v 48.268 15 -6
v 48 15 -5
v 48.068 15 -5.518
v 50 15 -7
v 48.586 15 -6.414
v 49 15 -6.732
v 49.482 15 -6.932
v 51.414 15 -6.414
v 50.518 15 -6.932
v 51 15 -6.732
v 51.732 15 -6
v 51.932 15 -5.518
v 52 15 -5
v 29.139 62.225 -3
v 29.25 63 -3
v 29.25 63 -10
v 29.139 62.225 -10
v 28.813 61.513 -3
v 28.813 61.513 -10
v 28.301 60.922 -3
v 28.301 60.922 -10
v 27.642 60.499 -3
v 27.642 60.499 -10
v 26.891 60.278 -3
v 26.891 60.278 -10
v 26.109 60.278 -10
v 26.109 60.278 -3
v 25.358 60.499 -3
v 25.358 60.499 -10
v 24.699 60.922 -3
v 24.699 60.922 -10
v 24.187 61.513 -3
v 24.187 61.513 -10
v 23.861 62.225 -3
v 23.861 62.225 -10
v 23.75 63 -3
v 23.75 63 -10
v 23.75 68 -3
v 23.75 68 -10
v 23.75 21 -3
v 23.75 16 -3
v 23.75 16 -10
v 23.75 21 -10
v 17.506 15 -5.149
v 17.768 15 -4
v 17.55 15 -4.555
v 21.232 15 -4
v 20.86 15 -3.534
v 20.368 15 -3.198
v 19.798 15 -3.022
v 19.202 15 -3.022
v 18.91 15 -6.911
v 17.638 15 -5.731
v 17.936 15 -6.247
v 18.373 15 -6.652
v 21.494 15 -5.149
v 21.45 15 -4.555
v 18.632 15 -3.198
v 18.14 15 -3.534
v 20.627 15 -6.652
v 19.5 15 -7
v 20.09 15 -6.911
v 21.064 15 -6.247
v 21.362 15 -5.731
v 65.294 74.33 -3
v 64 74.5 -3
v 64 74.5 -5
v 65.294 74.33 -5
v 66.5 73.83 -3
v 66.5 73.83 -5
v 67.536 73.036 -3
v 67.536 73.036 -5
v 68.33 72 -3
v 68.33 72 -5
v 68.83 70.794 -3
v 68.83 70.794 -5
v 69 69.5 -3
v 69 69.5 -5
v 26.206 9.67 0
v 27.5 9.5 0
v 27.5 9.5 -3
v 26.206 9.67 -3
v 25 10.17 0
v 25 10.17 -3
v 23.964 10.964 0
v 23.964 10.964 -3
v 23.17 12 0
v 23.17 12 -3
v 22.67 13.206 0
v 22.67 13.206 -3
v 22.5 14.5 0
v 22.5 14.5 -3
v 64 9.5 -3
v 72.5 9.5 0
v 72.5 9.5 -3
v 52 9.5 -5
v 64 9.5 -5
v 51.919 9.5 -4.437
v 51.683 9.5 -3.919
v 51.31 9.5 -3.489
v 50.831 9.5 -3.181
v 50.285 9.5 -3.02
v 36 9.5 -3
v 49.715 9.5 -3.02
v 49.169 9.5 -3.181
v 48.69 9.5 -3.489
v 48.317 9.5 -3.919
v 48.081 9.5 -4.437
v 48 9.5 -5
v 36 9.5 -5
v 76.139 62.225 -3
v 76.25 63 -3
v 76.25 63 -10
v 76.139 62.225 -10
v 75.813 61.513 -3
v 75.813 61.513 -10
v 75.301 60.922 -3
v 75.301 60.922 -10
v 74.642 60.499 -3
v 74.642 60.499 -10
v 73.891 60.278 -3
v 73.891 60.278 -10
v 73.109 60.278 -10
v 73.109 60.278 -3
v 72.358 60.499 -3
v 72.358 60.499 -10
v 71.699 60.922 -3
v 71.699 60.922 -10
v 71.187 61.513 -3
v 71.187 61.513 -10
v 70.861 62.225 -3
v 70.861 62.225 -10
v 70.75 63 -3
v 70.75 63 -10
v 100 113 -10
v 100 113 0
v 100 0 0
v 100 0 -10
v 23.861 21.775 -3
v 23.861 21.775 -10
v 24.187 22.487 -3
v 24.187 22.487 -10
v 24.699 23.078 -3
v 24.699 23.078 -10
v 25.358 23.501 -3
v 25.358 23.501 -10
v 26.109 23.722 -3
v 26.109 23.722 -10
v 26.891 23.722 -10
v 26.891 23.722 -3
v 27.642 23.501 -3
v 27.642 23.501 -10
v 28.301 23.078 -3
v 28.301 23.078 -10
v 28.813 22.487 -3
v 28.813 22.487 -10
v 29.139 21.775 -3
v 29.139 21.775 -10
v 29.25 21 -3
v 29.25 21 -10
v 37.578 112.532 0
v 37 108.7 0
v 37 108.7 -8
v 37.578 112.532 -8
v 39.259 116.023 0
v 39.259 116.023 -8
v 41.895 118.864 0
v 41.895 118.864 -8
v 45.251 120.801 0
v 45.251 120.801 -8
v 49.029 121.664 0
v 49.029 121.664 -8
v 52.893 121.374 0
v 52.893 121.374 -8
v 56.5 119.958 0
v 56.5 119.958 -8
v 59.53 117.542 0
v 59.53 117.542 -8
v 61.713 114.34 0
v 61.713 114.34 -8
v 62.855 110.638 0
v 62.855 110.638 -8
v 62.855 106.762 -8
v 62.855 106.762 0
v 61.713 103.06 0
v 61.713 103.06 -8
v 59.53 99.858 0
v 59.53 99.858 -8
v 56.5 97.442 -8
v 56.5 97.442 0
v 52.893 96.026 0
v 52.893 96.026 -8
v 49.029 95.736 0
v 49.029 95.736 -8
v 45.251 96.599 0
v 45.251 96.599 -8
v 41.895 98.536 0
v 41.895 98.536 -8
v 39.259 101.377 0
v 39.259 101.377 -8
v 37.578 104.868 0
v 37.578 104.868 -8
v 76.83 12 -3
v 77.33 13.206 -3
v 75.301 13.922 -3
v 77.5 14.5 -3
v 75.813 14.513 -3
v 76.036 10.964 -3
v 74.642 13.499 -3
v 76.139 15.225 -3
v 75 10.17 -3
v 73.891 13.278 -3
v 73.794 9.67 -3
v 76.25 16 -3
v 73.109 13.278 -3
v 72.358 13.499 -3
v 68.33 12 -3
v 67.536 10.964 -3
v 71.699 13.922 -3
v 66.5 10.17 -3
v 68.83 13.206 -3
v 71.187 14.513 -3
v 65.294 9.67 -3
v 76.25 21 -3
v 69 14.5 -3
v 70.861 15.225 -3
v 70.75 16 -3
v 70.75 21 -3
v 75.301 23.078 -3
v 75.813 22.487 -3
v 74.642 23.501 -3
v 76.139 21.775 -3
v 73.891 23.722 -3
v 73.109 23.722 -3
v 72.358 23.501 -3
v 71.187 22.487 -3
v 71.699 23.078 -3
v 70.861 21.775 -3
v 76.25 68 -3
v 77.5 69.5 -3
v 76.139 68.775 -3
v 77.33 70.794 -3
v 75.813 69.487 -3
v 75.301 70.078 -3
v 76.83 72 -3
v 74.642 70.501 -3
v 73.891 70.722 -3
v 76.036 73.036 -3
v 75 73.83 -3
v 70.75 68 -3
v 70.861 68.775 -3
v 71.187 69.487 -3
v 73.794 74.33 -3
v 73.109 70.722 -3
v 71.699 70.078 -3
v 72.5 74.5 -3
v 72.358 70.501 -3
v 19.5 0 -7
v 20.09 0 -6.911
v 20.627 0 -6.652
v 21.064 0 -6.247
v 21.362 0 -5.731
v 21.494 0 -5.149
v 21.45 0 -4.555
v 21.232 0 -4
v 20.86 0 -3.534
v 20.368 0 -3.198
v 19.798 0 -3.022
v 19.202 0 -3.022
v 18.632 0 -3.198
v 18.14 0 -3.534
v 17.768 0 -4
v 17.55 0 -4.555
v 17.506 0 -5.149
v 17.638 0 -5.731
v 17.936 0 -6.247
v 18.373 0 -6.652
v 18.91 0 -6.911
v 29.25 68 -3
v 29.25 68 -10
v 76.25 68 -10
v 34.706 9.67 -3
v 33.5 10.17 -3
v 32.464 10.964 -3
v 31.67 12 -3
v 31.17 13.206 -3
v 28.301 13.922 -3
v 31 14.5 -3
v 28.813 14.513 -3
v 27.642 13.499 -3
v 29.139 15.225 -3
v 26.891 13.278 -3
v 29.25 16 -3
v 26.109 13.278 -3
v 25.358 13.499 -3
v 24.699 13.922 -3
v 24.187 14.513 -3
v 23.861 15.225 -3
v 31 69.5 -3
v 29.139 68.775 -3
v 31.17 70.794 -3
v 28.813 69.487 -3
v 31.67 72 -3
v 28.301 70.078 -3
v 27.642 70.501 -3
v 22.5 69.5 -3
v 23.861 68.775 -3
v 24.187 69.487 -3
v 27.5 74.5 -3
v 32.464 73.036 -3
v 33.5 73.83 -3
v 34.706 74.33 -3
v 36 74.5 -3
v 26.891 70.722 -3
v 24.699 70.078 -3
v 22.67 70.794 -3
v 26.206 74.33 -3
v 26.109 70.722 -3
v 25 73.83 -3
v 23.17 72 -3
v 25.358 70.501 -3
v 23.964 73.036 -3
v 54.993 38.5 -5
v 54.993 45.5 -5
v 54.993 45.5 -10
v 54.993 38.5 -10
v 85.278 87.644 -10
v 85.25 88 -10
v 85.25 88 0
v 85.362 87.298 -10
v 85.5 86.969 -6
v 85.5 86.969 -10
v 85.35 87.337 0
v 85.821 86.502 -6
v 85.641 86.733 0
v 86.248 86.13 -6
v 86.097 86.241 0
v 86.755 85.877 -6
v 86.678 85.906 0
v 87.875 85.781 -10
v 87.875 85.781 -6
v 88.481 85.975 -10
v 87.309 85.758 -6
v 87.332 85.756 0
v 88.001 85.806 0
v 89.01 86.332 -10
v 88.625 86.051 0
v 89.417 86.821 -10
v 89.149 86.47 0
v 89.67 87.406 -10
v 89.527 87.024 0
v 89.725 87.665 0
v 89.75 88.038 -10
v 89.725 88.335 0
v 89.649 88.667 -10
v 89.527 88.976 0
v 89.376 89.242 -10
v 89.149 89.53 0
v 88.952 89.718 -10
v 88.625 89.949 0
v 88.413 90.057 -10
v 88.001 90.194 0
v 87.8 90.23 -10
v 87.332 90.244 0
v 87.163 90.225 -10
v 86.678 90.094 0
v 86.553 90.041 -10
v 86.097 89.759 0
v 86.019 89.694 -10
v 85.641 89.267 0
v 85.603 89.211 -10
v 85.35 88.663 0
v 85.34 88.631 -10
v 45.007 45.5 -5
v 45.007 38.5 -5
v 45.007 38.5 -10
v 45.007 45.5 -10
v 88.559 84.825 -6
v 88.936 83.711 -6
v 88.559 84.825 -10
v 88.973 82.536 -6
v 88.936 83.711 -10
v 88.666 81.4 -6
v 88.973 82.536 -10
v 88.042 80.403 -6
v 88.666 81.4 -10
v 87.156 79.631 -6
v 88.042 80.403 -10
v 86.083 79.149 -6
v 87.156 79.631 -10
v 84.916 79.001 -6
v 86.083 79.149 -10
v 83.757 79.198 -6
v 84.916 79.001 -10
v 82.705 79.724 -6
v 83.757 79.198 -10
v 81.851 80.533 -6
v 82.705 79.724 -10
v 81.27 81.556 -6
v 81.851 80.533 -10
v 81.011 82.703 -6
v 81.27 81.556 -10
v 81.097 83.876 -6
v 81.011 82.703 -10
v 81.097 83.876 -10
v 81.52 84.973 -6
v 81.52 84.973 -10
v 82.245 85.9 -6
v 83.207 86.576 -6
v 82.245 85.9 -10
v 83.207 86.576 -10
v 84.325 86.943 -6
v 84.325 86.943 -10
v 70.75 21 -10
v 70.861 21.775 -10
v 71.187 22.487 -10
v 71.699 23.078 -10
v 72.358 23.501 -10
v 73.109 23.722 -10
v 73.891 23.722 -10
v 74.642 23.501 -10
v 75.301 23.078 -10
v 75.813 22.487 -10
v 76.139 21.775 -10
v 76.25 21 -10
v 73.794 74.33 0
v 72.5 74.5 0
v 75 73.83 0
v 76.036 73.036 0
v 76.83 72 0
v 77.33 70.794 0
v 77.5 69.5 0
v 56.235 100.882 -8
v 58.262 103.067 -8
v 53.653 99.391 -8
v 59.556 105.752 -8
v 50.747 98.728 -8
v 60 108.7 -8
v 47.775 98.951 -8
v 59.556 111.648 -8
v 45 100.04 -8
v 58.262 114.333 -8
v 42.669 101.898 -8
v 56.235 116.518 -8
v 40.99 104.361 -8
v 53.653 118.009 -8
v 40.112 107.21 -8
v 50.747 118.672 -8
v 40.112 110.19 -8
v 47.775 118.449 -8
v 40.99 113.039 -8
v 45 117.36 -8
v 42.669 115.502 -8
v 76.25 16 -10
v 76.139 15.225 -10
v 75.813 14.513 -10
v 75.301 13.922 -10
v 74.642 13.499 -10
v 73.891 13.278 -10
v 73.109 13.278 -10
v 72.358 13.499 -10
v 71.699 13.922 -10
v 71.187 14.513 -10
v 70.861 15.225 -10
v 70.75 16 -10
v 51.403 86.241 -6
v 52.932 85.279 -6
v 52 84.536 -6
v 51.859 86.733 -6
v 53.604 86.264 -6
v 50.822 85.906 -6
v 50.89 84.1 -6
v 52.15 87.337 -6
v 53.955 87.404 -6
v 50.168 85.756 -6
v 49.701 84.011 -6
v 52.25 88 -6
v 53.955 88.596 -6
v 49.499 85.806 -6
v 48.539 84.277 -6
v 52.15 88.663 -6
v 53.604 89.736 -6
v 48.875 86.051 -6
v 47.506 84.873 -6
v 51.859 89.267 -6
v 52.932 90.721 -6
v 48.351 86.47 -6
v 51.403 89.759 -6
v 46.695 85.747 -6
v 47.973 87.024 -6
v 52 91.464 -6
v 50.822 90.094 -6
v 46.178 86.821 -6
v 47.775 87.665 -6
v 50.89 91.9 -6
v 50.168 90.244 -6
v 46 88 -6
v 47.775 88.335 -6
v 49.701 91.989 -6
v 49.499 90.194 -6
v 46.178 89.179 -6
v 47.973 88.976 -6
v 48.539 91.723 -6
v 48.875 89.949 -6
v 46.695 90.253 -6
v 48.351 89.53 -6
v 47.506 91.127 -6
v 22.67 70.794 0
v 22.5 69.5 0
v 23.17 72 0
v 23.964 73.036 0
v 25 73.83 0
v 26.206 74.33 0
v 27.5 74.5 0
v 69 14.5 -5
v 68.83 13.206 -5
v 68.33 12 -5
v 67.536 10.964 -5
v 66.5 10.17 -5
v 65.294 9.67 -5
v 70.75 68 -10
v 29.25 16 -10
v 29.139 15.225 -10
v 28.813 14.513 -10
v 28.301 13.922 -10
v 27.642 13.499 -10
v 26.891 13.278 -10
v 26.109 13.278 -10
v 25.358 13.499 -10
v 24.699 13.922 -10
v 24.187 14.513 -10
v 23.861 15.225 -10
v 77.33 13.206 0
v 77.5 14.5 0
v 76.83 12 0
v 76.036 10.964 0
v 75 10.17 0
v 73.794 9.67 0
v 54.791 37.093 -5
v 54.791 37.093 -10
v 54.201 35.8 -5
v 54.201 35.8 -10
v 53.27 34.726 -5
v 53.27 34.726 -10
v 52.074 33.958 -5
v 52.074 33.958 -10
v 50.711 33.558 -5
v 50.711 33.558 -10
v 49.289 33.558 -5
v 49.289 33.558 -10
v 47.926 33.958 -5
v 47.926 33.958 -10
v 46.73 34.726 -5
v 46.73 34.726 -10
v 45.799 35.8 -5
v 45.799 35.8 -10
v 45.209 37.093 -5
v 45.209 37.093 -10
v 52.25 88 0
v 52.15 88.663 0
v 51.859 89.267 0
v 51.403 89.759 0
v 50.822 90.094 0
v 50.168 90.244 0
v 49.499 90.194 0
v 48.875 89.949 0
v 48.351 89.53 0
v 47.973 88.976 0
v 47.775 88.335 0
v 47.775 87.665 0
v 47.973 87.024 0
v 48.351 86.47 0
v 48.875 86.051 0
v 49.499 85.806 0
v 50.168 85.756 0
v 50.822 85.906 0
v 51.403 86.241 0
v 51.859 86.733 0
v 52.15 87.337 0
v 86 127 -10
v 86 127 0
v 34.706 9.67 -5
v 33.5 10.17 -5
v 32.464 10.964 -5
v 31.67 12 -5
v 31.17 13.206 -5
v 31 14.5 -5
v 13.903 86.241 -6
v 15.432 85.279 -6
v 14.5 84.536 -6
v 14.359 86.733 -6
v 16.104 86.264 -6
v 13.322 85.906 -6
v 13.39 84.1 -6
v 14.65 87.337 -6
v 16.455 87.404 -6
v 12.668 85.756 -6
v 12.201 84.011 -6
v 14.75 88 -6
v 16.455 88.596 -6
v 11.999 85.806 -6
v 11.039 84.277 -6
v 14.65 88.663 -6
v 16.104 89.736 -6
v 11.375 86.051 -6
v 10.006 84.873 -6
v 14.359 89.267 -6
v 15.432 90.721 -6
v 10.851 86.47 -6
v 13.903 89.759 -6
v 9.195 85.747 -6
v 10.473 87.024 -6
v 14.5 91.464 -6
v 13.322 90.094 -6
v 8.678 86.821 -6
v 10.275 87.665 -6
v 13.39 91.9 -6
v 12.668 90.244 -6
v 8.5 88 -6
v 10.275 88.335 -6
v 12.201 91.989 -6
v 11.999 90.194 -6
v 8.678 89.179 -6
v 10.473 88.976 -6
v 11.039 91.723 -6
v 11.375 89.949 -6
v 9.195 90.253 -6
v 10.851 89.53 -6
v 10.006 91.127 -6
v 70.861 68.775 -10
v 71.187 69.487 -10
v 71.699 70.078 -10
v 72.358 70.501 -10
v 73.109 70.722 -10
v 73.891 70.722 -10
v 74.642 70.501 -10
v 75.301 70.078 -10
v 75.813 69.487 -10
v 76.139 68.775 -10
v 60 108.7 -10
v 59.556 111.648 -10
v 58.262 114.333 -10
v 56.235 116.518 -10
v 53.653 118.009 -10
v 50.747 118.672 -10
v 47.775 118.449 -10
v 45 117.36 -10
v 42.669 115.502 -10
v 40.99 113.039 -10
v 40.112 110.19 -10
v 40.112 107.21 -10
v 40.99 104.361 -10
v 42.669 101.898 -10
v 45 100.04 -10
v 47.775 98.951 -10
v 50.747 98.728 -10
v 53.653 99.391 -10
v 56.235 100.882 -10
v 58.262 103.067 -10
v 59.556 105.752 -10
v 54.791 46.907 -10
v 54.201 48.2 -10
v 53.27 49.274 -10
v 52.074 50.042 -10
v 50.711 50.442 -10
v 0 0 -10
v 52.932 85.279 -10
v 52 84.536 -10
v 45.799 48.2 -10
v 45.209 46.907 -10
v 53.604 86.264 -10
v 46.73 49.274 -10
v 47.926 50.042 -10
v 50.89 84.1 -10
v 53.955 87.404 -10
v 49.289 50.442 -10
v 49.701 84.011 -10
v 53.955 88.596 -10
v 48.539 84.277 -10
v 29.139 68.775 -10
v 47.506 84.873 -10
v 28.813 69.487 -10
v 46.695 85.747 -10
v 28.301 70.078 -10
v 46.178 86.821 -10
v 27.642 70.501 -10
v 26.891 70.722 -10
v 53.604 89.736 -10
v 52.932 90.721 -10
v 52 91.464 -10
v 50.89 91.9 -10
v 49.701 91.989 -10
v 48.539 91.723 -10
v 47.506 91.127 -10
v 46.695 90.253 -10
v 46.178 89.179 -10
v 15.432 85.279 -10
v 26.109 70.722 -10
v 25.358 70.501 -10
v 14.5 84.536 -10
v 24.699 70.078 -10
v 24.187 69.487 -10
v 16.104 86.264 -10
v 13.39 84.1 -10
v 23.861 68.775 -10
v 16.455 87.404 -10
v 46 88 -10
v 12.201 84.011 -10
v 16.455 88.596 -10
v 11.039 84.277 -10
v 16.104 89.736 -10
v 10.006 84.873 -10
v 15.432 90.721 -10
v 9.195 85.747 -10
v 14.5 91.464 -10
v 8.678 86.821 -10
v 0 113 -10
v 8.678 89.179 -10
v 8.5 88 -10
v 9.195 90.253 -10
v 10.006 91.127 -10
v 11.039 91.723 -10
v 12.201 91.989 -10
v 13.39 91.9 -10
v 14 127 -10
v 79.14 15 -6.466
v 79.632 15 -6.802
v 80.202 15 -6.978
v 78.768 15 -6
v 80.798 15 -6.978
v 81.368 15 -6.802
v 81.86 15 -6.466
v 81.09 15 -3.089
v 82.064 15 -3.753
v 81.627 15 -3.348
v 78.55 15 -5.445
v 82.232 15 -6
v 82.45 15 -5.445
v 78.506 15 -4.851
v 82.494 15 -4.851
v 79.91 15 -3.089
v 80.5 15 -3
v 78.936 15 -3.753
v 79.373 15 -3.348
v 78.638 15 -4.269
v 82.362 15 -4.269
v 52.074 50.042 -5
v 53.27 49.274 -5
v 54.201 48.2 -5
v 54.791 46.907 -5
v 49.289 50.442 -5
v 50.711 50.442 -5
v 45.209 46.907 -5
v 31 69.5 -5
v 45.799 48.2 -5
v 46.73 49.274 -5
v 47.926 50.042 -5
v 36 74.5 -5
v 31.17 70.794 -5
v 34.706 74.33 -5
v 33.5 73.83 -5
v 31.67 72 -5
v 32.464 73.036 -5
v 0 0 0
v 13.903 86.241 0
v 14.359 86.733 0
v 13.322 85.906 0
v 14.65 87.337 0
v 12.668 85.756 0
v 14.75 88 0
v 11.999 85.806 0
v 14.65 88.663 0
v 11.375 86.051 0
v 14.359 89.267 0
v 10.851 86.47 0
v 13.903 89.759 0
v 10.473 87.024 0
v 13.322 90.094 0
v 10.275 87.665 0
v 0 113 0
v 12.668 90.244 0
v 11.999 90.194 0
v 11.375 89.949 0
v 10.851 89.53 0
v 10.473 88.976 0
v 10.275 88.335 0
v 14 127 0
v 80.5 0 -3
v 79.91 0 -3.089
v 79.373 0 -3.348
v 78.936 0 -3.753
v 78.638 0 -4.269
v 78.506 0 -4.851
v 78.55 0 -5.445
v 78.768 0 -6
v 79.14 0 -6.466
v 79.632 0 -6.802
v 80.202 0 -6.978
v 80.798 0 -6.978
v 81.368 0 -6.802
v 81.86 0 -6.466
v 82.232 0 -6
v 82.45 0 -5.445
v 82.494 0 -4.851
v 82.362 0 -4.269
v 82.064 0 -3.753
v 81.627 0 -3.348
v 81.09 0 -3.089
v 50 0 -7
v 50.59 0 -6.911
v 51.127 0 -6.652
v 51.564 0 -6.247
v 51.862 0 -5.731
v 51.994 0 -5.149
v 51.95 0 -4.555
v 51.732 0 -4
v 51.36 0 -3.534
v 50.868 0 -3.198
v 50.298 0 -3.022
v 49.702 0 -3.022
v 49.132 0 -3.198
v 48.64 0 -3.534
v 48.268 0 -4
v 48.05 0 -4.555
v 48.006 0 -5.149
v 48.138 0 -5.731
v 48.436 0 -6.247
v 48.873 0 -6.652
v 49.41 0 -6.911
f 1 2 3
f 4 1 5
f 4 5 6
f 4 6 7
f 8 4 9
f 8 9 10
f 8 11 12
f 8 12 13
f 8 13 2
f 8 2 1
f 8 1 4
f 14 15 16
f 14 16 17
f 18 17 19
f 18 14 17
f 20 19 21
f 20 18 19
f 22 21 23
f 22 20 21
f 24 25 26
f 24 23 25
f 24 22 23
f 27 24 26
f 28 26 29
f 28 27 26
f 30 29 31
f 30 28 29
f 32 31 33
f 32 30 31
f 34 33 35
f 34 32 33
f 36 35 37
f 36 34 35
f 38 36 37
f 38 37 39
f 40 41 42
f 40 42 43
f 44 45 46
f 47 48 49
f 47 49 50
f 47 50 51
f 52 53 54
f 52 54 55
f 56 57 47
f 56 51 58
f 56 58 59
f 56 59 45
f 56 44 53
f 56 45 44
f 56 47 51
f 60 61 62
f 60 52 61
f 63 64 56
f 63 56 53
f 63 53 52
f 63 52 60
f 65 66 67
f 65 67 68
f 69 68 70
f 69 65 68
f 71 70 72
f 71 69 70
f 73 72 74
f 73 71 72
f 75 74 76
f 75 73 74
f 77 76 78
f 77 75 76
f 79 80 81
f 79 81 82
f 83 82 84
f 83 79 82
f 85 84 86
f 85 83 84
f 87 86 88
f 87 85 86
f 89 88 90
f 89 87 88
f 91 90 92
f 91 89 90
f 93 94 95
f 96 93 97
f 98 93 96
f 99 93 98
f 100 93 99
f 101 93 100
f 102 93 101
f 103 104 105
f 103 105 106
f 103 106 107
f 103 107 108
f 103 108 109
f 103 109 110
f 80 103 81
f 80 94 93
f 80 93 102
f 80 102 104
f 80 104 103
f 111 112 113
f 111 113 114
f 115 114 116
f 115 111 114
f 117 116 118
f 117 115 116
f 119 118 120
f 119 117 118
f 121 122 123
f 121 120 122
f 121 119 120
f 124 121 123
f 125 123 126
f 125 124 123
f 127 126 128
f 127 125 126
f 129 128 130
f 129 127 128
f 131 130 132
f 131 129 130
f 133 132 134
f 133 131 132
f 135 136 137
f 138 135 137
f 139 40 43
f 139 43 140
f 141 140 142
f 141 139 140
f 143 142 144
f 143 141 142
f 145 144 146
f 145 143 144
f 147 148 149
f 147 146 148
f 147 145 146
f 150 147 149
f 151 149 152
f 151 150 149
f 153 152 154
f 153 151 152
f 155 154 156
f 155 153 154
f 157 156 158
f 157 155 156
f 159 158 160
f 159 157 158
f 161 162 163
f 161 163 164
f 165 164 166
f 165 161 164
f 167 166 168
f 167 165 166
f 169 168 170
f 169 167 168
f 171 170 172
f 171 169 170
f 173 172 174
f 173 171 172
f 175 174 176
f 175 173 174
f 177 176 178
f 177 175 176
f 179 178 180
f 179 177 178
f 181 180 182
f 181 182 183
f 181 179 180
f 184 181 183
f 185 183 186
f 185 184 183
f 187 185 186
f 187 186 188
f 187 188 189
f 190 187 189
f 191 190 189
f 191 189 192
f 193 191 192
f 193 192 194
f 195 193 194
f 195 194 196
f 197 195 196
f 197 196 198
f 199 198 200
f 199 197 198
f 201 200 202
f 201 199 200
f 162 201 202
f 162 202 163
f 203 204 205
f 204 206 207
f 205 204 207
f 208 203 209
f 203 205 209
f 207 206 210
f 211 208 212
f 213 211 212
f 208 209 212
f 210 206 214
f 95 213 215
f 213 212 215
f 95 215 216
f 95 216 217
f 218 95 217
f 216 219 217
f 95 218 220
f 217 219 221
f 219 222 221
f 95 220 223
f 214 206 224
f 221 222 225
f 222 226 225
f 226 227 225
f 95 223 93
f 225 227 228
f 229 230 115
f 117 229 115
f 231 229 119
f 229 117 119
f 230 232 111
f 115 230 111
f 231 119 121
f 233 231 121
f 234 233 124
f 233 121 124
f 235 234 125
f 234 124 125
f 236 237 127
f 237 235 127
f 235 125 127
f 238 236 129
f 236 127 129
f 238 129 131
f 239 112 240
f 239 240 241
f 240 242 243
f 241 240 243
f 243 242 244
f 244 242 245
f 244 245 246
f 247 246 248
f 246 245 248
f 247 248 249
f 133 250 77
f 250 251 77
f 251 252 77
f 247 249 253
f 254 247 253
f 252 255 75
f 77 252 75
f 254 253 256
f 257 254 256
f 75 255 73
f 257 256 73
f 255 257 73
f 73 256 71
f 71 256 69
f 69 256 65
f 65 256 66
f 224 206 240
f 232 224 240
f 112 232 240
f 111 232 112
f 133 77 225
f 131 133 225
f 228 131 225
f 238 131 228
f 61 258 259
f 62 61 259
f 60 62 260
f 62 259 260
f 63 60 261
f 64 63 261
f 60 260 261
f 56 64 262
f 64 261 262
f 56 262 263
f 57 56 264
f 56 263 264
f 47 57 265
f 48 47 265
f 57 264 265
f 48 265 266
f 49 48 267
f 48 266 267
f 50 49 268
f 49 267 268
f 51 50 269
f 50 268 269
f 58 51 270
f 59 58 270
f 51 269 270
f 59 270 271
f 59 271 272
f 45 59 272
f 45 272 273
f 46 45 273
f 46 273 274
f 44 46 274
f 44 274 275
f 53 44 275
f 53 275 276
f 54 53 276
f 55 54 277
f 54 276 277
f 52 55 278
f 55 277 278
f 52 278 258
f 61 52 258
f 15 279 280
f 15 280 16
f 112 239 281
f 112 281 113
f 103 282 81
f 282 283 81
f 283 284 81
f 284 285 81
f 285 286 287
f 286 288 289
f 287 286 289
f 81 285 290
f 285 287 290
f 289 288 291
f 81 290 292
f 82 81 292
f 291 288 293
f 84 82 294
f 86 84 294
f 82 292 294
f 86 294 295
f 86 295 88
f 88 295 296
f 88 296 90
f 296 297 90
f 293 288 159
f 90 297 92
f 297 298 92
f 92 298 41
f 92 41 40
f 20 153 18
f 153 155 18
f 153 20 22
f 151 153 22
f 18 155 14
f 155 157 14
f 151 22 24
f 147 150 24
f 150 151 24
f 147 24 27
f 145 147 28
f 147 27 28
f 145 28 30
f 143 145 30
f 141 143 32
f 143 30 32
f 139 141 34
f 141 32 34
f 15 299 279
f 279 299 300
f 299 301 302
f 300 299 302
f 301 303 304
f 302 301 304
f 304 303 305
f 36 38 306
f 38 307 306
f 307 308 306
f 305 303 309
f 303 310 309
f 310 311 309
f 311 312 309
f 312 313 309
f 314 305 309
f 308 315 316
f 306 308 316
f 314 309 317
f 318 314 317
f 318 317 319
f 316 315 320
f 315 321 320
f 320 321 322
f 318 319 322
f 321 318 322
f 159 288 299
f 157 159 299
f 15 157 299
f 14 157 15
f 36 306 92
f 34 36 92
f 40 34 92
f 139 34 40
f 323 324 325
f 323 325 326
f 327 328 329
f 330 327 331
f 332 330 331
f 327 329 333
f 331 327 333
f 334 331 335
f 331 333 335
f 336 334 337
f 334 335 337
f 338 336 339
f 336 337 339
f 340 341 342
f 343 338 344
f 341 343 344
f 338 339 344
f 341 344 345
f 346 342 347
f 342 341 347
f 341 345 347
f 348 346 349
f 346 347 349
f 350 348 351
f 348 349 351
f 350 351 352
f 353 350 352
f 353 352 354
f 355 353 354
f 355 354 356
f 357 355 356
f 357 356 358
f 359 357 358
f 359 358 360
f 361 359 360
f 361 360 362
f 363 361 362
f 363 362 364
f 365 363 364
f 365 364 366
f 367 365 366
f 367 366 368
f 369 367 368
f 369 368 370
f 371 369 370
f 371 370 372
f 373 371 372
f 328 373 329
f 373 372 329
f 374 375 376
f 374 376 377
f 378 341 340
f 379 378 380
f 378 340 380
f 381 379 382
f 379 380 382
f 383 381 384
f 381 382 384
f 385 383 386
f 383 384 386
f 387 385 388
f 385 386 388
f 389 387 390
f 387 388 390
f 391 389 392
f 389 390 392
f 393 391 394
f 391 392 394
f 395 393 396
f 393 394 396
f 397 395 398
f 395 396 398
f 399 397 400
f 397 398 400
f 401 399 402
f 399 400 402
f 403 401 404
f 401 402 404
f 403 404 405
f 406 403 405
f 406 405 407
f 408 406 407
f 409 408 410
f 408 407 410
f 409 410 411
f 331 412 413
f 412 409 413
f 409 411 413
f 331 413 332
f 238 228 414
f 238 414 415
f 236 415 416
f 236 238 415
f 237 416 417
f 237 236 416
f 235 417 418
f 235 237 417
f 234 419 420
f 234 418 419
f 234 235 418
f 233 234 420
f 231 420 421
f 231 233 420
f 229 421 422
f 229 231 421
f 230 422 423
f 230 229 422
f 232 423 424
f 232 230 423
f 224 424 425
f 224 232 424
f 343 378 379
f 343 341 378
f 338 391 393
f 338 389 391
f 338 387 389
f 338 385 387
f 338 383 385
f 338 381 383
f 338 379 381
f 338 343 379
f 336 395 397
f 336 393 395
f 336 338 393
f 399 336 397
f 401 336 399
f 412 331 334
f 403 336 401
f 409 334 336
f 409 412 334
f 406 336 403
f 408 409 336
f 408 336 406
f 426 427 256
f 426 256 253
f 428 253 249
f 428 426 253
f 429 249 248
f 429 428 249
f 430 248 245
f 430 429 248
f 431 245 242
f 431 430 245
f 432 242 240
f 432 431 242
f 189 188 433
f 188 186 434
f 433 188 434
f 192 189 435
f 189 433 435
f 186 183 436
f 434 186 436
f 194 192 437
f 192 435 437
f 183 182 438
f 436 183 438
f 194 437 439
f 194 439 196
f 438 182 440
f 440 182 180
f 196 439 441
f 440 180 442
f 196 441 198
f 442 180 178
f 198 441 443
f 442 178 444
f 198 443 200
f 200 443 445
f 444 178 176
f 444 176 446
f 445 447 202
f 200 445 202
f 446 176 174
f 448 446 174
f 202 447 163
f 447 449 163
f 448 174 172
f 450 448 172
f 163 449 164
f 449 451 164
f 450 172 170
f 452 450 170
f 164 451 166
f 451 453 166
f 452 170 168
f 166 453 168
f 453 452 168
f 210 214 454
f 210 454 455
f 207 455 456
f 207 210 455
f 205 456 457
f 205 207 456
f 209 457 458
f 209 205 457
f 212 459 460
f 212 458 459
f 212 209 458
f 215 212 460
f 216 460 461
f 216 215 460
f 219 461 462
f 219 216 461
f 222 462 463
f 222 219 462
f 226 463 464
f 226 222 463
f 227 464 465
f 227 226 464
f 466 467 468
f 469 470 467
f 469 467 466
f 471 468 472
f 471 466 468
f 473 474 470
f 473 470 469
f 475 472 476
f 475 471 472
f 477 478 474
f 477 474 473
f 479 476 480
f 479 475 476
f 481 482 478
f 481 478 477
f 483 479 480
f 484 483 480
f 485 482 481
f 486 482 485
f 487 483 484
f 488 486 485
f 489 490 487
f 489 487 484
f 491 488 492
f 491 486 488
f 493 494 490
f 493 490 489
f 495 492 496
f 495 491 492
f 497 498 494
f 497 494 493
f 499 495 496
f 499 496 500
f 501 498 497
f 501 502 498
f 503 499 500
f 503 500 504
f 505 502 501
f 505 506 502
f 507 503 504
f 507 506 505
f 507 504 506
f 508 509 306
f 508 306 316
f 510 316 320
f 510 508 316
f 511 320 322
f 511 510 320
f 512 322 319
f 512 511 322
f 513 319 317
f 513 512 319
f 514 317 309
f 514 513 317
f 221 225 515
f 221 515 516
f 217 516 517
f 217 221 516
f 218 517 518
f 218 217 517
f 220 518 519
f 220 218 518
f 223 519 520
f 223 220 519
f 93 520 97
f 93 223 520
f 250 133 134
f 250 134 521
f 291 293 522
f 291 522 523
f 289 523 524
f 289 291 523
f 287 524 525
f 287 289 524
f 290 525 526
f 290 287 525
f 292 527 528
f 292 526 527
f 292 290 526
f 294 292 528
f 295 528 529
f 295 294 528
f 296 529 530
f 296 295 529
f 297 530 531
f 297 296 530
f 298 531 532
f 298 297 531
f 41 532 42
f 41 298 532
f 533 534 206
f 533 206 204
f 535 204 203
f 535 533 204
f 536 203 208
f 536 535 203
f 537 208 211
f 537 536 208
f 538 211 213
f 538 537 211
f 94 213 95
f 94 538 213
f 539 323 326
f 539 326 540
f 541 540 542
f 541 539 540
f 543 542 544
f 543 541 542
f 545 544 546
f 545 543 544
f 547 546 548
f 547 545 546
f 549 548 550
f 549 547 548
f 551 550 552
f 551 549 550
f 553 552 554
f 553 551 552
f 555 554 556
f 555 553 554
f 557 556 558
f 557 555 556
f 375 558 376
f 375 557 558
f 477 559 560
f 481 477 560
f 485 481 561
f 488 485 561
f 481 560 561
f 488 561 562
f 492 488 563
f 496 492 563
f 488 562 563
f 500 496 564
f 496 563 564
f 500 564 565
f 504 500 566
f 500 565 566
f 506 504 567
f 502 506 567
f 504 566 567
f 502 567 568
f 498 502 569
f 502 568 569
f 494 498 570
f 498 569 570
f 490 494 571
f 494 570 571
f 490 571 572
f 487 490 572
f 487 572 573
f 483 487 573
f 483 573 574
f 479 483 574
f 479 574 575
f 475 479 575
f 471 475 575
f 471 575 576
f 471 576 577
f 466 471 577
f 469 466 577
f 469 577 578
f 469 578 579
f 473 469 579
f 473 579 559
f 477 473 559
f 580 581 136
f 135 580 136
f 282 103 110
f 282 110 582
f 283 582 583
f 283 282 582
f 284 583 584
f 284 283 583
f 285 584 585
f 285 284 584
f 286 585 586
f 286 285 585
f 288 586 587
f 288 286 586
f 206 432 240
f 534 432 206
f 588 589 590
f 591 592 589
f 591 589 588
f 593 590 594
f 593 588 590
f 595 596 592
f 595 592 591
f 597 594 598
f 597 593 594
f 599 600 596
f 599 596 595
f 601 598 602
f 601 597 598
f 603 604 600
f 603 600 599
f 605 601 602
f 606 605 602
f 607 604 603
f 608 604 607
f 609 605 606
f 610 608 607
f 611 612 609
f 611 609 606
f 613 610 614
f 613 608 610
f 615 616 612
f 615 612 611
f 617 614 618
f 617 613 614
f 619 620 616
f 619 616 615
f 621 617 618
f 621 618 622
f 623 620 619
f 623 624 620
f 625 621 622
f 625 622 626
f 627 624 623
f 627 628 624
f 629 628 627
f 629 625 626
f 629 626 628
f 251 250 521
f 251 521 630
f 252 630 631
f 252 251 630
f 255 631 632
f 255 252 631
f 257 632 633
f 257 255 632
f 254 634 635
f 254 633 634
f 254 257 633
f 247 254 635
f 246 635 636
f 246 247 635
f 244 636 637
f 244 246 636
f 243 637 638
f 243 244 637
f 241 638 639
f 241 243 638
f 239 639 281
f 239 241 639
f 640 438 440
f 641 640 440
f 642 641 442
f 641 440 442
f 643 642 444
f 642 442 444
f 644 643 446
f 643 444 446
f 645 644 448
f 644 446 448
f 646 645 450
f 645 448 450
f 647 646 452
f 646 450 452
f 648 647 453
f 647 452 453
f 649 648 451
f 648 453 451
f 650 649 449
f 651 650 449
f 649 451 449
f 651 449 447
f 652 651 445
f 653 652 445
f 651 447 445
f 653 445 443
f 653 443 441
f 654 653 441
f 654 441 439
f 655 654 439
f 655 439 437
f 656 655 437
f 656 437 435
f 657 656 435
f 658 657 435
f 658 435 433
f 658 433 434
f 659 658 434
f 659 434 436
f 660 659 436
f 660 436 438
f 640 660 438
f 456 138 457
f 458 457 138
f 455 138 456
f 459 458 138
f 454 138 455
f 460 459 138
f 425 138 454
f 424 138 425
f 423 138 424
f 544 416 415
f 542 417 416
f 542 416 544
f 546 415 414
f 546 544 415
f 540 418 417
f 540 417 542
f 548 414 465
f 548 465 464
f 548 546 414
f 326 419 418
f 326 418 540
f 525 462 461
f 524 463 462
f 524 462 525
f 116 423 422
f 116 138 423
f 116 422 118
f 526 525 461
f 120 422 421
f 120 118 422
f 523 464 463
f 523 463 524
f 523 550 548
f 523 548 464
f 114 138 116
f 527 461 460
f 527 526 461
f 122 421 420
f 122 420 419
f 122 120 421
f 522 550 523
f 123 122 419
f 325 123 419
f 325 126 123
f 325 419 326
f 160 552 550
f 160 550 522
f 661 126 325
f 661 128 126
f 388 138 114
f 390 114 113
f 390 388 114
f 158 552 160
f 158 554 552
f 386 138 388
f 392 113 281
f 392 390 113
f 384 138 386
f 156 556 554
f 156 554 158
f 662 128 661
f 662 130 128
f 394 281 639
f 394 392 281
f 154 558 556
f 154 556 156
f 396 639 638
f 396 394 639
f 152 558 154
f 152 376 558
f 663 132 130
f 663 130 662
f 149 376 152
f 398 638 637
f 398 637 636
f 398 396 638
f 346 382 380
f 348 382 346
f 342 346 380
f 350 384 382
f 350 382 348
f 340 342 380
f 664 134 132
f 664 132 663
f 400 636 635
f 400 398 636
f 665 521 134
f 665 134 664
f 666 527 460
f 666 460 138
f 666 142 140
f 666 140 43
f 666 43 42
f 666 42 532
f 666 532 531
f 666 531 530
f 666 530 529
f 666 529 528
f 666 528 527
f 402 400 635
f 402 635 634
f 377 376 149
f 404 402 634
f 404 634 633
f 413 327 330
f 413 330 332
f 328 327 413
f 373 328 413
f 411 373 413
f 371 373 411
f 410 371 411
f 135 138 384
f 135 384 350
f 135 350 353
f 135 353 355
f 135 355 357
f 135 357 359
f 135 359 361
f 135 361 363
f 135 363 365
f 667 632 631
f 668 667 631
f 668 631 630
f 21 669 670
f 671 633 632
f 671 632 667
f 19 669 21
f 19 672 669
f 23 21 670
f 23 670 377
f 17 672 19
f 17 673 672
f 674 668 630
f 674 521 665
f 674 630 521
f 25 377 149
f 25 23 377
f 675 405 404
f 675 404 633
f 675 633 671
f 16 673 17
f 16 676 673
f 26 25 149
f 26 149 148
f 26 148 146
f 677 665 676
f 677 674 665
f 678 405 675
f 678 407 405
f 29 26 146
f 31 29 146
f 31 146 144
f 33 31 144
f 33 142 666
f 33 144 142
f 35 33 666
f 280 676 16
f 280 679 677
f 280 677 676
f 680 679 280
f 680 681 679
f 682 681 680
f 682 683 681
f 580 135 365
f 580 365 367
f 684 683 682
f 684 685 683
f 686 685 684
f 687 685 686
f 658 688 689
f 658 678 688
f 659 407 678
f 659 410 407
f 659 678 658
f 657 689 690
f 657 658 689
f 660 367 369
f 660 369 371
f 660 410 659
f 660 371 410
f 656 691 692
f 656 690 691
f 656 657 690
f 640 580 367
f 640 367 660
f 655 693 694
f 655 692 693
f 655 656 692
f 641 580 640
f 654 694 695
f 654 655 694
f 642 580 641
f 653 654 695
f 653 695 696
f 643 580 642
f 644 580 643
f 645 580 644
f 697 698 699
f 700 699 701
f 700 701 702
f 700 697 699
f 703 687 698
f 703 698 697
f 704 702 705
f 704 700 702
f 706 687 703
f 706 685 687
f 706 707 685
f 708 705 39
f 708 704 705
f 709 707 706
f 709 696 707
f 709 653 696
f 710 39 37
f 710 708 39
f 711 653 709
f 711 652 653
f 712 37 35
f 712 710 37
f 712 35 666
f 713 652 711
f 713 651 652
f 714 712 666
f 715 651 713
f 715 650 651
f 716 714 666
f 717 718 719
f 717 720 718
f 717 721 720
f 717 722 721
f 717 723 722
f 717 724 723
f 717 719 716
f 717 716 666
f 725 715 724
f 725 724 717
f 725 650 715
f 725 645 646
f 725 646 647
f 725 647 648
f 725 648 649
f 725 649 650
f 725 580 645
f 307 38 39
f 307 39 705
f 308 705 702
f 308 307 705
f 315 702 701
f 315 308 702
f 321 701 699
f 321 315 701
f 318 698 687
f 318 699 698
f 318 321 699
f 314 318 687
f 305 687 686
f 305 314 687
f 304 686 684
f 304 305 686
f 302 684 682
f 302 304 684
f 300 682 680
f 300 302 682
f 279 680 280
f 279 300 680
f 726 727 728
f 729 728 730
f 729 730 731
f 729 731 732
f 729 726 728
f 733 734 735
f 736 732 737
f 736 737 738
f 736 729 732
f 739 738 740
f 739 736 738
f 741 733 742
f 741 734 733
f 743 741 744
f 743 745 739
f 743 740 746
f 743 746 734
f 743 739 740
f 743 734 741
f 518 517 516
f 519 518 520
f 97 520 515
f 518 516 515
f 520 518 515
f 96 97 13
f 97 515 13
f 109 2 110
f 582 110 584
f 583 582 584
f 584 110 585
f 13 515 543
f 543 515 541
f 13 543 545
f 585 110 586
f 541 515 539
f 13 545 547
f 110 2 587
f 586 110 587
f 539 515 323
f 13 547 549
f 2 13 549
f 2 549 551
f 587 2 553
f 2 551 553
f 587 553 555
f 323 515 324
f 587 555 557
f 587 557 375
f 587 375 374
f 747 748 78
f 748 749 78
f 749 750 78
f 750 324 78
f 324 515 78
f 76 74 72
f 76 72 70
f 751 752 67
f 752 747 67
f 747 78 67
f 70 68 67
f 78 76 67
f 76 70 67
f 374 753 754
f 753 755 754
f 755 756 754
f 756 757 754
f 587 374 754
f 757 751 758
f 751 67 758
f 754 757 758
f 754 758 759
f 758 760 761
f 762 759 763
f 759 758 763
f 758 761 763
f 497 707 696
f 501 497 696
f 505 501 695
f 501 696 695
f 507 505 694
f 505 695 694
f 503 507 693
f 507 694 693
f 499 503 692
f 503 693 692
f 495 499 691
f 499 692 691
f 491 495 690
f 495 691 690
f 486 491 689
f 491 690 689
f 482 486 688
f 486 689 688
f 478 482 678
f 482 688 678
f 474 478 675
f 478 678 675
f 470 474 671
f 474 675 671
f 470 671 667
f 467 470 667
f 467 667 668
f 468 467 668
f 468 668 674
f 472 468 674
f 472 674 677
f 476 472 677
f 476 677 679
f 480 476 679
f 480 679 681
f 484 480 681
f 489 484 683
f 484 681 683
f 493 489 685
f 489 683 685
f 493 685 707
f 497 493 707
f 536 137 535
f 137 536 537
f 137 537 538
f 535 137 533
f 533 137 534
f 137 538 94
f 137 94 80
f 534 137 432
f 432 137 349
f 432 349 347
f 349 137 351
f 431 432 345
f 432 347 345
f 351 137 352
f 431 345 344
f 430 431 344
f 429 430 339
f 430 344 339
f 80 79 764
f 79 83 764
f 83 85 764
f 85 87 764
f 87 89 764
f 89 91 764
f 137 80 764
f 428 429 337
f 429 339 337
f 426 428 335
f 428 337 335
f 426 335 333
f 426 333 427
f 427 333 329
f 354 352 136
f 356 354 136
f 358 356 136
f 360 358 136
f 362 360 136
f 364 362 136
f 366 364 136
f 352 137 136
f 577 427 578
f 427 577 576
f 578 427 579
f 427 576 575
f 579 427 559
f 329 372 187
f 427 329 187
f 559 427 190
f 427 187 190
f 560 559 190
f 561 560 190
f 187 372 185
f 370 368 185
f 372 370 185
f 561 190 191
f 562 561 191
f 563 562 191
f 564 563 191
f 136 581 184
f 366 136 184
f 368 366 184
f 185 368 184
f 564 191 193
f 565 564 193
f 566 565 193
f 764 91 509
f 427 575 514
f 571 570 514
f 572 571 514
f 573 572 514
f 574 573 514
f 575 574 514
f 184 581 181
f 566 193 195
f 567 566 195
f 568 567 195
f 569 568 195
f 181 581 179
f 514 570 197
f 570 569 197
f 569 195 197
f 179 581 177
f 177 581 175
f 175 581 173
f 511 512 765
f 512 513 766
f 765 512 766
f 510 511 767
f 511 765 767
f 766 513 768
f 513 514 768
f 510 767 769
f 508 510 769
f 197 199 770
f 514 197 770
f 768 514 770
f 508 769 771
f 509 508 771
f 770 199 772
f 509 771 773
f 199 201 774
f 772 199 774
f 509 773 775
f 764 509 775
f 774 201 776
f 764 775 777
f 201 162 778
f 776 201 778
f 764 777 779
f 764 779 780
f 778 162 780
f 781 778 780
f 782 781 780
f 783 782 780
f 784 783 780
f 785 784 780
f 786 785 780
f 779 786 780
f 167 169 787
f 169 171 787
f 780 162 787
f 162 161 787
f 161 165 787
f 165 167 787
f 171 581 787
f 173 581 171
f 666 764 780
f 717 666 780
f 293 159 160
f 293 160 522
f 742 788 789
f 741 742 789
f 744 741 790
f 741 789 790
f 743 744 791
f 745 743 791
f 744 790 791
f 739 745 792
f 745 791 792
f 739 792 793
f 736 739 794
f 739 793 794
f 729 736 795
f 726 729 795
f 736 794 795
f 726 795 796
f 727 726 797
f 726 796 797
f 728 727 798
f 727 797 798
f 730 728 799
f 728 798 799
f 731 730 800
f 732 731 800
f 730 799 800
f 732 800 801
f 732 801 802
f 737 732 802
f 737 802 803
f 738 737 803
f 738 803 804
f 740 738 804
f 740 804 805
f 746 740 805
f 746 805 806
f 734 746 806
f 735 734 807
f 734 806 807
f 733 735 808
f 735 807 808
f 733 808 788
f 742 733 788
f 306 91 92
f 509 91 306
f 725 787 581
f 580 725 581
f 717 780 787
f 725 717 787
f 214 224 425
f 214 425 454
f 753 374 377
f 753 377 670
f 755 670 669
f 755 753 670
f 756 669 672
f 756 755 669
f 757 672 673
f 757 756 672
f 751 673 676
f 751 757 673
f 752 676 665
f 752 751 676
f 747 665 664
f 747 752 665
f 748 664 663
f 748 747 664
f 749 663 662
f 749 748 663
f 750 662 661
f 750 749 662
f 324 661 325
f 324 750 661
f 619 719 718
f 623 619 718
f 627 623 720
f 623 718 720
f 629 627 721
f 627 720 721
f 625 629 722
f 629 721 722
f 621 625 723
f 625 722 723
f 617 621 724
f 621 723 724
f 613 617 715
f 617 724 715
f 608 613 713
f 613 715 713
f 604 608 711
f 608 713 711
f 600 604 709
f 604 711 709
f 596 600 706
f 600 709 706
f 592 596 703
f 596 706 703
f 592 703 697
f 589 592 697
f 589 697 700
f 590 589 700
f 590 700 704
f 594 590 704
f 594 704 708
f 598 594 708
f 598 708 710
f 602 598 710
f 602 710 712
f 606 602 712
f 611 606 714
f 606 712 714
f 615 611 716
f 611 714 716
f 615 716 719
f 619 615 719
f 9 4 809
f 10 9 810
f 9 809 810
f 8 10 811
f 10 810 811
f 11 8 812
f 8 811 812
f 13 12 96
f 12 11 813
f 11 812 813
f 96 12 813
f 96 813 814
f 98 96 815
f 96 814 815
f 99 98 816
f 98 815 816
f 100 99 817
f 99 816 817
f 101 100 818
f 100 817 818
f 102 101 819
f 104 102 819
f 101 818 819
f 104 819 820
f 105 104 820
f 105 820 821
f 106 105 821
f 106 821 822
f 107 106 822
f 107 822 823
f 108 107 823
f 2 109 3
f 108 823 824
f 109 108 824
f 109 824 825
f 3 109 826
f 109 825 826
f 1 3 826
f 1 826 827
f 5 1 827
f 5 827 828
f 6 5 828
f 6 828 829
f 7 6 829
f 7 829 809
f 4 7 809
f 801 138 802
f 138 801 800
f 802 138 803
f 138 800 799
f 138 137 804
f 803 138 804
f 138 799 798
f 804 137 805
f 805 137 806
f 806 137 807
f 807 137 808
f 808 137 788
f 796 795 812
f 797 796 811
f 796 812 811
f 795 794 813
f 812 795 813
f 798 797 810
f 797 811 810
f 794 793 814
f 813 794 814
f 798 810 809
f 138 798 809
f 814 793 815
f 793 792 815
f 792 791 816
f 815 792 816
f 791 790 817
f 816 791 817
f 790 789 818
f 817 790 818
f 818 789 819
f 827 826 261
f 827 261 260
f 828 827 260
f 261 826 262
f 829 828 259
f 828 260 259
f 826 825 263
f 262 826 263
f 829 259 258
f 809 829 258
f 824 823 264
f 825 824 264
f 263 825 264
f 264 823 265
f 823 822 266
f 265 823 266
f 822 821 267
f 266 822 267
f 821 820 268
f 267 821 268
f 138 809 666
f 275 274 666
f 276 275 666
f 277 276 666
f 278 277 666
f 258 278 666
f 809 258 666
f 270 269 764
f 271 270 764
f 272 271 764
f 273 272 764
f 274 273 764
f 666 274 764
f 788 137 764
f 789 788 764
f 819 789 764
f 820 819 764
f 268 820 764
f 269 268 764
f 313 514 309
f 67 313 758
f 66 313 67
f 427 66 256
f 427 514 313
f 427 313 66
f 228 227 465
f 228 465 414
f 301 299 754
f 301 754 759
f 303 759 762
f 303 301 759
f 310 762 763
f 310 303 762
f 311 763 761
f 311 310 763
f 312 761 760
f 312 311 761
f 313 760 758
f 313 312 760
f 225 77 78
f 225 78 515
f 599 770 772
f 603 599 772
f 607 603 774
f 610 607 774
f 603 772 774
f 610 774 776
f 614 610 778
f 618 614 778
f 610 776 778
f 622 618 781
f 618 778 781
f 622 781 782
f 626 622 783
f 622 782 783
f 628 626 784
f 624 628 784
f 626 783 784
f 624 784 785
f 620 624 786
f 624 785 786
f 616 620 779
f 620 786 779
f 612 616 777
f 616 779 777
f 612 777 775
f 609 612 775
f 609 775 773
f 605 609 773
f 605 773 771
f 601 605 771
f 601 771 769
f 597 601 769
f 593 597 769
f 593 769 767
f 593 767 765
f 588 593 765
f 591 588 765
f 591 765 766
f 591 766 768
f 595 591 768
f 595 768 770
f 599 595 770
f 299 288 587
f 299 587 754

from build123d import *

# Parameters (mm, degrees)
ESTRUSIONE_ESTRUSIONE1_DEPTH = 10
SCHIZZO2_R                   = 10
TAGLIO_ESTRUSIONE1_DEPTH     = 10
SCHIZZO3_R                   = 2.25
TAGLIO_ESTRUSIONE2_DEPTH     = 10
TAGLIO_ESTRUSIONE3_DEPTH     = 3
TAGLIO_ESTRUSIONE4_DEPTH     = 2
TAGLIO_ESTRUSIONE5_DEPTH     = 162.721983663
TAGLIO_ESTRUSIONE6_DEPTH     = 162.796168063
SCHIZZO8_R                   = 13
TAGLIO_ESTRUSIONE7_DEPTH     = 8
SCHIZZO9_R                   = 4
TAGLIO_ESTRUSIONE8_DEPTH     = 4
SCHIZZO10_R                  = 2
TAGLIO_ESTRUSIONE9_DEPTH     = 15


with BuildPart() as part:
    # Schizzo1 → Estrusione-Estrusione1 (new body)
    with BuildSketch(Plane.XY):
        Polygon((0, 113), (14, 127), (86, 127), (100, 113), (100, 0), (0, 0), align=None)
    extrude(amount=-ESTRUSIONE_ESTRUSIONE1_DEPTH)

    # Schizzo2 → Taglio-Estrusione1 (cut)
    with BuildSketch(Plane.XY):
        with Locations((50, 108.7)):
            Circle(SCHIZZO2_R)
    extrude(amount=-TAGLIO_ESTRUSIONE1_DEPTH, mode=Mode.SUBTRACT)

    # Schizzo3 → Taglio-Estrusione2 (cut)
    with BuildSketch(Plane.XY):
        with Locations((12.5, 88)):
            Circle(SCHIZZO3_R)
        with Locations((50, 88)):
            Circle(SCHIZZO3_R)
        with Locations(Location((87.5, 88, 0), (0, 0, 180))):
            Circle(SCHIZZO3_R)
    extrude(amount=-TAGLIO_ESTRUSIONE2_DEPTH, mode=Mode.SUBTRACT)

    # Schizzo4 → Taglio-Estrusione3 (cut)
    with BuildSketch(Plane.XY):
        with BuildLine():
            Line((27.5, 74.5), (72.5, 74.5))
            ThreePointArc((72.5, 74.5), (76.035533906, 73.035533906), (77.5, 69.5))
            Line((77.5, 69.5), (77.5, 14.5))
            ThreePointArc((77.5, 14.5), (76.035533906, 10.964466094), (72.5, 9.5))
            Line((72.5, 9.5), (27.5, 9.5))
            ThreePointArc((27.5, 9.5), (23.964466094, 10.964466094), (22.5, 14.5))
            Line((22.5, 14.5), (22.5, 69.5))
            ThreePointArc((22.5, 69.5), (23.964466094, 73.035533906), (27.5, 74.5))
        make_face()
    extrude(amount=-TAGLIO_ESTRUSIONE3_DEPTH, mode=Mode.SUBTRACT)

    # Schizzo5 → Taglio-Estrusione4 (cut)
    with BuildSketch(Plane.XY.offset(-3)):
        with BuildLine():
            Line((36, 74.5), (64, 74.5))
            ThreePointArc((64, 74.5), (67.535533906, 73.035533906), (69, 69.5))
            Line((69, 69.5), (69, 14.5))
            ThreePointArc((69, 14.5), (67.535533906, 10.964466094), (64, 9.5))
            Line((64, 9.5), (36, 9.5))
            ThreePointArc((36, 9.5), (32.464466094, 10.964466094), (31, 14.5))
            Line((31, 14.5), (31, 69.5))
            ThreePointArc((31, 69.5), (32.464466094, 73.035533906), (36, 74.5))
        make_face()
    extrude(amount=-TAGLIO_ESTRUSIONE4_DEPTH, mode=Mode.SUBTRACT)

    # Schizzo6 → Taglio-Estrusione5 (cut, through all)
    with BuildSketch(Plane.XY.offset(-5)):
        with BuildLine():
            Line((54.993239352, 45.5), (54.993239352, 38.5))
            ThreePointArc((54.993239352, 38.5), (50, 33.506760648), (45.006760648, 38.5))
            Line((45.006760648, 38.5), (45.006760648, 45.5))
            ThreePointArc((45.006760648, 45.5), (50, 50.493239352), (54.993239352, 45.5))
        make_face()
    extrude(amount=-TAGLIO_ESTRUSIONE5_DEPTH, mode=Mode.SUBTRACT)

    # Schizzo7 → Taglio-Estrusione6 (cut, through all)
    with BuildSketch(Plane.XY.offset(-3)):
        with BuildLine():
            Line((23.75, 63), (23.75, 68))
            ThreePointArc((23.75, 68), (26.5, 70.75), (29.25, 68))
            Line((29.25, 68), (29.25, 63))
            ThreePointArc((29.25, 63), (26.5, 60.25), (23.75, 63))
        make_face()
        with BuildLine():
            Line((70.75, 63), (70.75, 68))
            ThreePointArc((70.75, 68), (73.5, 70.75), (76.25, 68))
            Line((76.25, 68), (76.25, 63))
            ThreePointArc((76.25, 63), (73.5, 60.25), (70.75, 63))
        make_face()
        with BuildLine():
            Line((23.75, 16), (23.75, 21))
            ThreePointArc((23.75, 21), (26.5, 23.75), (29.25, 21))
            Line((29.25, 21), (29.25, 16))
            ThreePointArc((29.25, 16), (26.5, 13.25), (23.75, 16))
        make_face()
        with BuildLine():
            Line((70.75, 16), (70.75, 21))
            ThreePointArc((70.75, 21), (73.5, 23.75), (76.25, 21))
            Line((76.25, 21), (76.25, 16))
            ThreePointArc((76.25, 16), (73.5, 13.25), (70.75, 16))
        make_face()
    extrude(amount=-TAGLIO_ESTRUSIONE6_DEPTH, mode=Mode.SUBTRACT)

    # Schizzo8 → Taglio-Estrusione7 (cut)
    with BuildSketch(Plane(origin=(0, 0, 0), x_dir=(-1, 0, 0), z_dir=(0, 0, -1))):
        with Locations((-50, 108.7)):
            Circle(SCHIZZO8_R)
    extrude(amount=TAGLIO_ESTRUSIONE7_DEPTH, mode=Mode.SUBTRACT)

    # Schizzo9 → Taglio-Estrusione8 (cut)
    with BuildSketch(Plane(origin=(0, 0, -10), x_dir=(-1, 0, 0), z_dir=(0, 0, -1))):
        with Locations((-85, 83)):
            Circle(SCHIZZO9_R)
        with Locations((-50, 88)):
            Circle(SCHIZZO9_R)
        with Locations((-12.5, 88)):
            Circle(SCHIZZO9_R)
    extrude(amount=-TAGLIO_ESTRUSIONE8_DEPTH, mode=Mode.SUBTRACT)

    # Schizzo10 → Taglio-Estrusione9 (cut)
    with BuildSketch(Plane.XZ):
        with Locations(Location((50, -5, 0), (0, 0, 270))):
            Circle(SCHIZZO10_R)
        with Locations(Location((19.5, -5, 0), (0, 0, 270))):
            Circle(SCHIZZO10_R)
        with Locations(Location((80.5, -5, 0), (0, 0, 90))):
            Circle(SCHIZZO10_R)
    extrude(amount=-TAGLIO_ESTRUSIONE9_DEPTH, mode=Mode.SUBTRACT)


solid = part.part
